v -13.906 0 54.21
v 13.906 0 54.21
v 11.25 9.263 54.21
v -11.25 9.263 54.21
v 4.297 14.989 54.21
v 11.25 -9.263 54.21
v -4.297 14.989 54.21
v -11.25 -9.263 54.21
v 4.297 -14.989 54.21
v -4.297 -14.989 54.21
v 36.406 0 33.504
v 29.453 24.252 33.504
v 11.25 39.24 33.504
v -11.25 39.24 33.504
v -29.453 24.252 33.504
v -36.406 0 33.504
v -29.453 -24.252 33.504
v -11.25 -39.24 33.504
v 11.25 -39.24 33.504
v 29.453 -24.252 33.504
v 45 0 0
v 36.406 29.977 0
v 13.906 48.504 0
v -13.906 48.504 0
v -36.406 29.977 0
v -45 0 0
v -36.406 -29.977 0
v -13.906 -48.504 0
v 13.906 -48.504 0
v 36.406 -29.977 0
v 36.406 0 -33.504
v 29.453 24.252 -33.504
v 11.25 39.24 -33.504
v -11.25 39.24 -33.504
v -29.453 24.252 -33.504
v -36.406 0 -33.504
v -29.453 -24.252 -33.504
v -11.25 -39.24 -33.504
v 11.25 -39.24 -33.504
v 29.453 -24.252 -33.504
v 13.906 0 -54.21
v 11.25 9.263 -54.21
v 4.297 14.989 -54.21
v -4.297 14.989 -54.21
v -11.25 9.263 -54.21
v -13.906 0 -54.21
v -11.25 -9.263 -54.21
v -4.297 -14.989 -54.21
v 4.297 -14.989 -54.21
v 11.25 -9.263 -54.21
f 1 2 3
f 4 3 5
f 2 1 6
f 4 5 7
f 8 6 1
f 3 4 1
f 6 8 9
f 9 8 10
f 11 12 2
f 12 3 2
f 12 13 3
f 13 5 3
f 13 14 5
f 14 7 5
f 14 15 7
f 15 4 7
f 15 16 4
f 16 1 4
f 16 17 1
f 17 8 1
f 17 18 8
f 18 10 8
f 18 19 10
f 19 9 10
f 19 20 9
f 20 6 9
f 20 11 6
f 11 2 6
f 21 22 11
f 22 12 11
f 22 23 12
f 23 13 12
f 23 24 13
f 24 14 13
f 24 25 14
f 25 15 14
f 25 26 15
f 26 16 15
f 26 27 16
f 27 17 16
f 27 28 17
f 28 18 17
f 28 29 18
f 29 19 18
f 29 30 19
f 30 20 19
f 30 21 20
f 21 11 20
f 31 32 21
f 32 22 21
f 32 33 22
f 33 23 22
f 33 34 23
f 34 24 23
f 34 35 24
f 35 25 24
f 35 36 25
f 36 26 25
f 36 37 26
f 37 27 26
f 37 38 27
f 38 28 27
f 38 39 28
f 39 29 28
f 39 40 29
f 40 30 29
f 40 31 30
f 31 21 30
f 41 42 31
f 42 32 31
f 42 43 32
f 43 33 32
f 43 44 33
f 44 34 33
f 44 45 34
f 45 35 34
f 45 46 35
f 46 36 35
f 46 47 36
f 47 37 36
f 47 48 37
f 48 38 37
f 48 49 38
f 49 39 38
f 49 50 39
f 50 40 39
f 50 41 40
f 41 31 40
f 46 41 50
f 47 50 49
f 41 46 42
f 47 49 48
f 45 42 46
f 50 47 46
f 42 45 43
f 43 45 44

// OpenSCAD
// Generated by SolidPython 1.0.1 on 2020-07-29 00:46:52


scale(v = [15, 17, 19]) {
	sphere(r = 3);
}
/***********************************************
*********      SolidPython code:      **********
************************************************
 
# import packages: SolidPython
from solid import *
from solid.utils import *
from itertools import chain, combinations, permutations


class Resize:

    def __init__(self, scad_file):
        self.scad_file = scad_file
        #self.scad_file = import_scad(scad_file)
        # cone/cylinder param:
        self.r1 = 0
        self.r2 = 0
        self.h = 0
        # rectangular prism param:
        self.w = 0
        self.l = 0
        # ellipse param:
        self.r = 0

    # import OpenScad code (file name corresponds to shape)


    # classify shape + parameters
    def assign(self, param1, param2, param3):
        if self.scad_file == 'cone.scad':
            self.r1 = param1
            self.r2 = param2
            self.h = param3
        elif self.scad_file == 'cylinder.scad':
            self.r1 = param1
            self.r2 = param2
            self.h = param3
        elif self.scad_file == 'rectangularPrism.scad':
            self.h = param1
            self.l = param2
            self.w = param3
        else:
            self.r = param1
            self.h = param2

    # resize parameters
    def iterate(self):
        x = range(3, 20, 2)
        i = 1
        if self.scad_file == 'cone.scad':
            tempList = list(permutations(x, 2))
            for temp in tempList:
                param1 = temp[0]
                param2 = temp[1]
                filepath = 'produced_scad_files/' + 'cone' + str(param1) + '_' + str(param2) + '_' + '.scad'
                scad_render_to_file(cylinder(h=param1, r1=param2, r2=0), filepath)

        elif self.scad_file == 'cylinder.scad':
            tempList = list(permutations(x, 3))
            for temp in tempList:
                param1 = temp[0]
                param2 = temp[1]
                filepath = 'produced_scad_files/' + 'cylinder' + str(param1) + '_' + str(param2) + '_' + '.scad'
                scad_render_to_file(cylinder(h=param1, r1=param2, r2=param2), filepath)

        elif self.scad_file == 'rectangularPrism.scad':
            tempList = list(permutations(x, 3))
            for temp in tempList:
                param1 = temp[0]
                param2 = temp[1]
                param3 = temp[2]
                filepath = 'produced_scad_files/' + 'rectangularPrism' + str(param1) + '_' + str(param2) + '_' + str(
                    param3) + '.scad'
                scad_render_to_file(cube(size=(param1, param2, param3)), filepath)

        elif self.scad_file == 'ellipse.scad':
            tempList = list(permutations(x, 4))
            for temp in tempList:
                param1 = temp[0]
                param2 = temp[1]
                param3 = temp[2]
                param4 = temp[3]
                filepath = 'produced_scad_files/' + 'ellipse' + str(param1) + '_' + str(param2) + '_' + str(param3) + '_' + str(param4) + '.scad'
                scad_render_to_file(scale([param1, param2, param3])(sphere(r=param4)), filepath)

    def render_to_scadfile(self):
        scad_render_to_file(scad, 'example.scad') 
 
************************************************/
